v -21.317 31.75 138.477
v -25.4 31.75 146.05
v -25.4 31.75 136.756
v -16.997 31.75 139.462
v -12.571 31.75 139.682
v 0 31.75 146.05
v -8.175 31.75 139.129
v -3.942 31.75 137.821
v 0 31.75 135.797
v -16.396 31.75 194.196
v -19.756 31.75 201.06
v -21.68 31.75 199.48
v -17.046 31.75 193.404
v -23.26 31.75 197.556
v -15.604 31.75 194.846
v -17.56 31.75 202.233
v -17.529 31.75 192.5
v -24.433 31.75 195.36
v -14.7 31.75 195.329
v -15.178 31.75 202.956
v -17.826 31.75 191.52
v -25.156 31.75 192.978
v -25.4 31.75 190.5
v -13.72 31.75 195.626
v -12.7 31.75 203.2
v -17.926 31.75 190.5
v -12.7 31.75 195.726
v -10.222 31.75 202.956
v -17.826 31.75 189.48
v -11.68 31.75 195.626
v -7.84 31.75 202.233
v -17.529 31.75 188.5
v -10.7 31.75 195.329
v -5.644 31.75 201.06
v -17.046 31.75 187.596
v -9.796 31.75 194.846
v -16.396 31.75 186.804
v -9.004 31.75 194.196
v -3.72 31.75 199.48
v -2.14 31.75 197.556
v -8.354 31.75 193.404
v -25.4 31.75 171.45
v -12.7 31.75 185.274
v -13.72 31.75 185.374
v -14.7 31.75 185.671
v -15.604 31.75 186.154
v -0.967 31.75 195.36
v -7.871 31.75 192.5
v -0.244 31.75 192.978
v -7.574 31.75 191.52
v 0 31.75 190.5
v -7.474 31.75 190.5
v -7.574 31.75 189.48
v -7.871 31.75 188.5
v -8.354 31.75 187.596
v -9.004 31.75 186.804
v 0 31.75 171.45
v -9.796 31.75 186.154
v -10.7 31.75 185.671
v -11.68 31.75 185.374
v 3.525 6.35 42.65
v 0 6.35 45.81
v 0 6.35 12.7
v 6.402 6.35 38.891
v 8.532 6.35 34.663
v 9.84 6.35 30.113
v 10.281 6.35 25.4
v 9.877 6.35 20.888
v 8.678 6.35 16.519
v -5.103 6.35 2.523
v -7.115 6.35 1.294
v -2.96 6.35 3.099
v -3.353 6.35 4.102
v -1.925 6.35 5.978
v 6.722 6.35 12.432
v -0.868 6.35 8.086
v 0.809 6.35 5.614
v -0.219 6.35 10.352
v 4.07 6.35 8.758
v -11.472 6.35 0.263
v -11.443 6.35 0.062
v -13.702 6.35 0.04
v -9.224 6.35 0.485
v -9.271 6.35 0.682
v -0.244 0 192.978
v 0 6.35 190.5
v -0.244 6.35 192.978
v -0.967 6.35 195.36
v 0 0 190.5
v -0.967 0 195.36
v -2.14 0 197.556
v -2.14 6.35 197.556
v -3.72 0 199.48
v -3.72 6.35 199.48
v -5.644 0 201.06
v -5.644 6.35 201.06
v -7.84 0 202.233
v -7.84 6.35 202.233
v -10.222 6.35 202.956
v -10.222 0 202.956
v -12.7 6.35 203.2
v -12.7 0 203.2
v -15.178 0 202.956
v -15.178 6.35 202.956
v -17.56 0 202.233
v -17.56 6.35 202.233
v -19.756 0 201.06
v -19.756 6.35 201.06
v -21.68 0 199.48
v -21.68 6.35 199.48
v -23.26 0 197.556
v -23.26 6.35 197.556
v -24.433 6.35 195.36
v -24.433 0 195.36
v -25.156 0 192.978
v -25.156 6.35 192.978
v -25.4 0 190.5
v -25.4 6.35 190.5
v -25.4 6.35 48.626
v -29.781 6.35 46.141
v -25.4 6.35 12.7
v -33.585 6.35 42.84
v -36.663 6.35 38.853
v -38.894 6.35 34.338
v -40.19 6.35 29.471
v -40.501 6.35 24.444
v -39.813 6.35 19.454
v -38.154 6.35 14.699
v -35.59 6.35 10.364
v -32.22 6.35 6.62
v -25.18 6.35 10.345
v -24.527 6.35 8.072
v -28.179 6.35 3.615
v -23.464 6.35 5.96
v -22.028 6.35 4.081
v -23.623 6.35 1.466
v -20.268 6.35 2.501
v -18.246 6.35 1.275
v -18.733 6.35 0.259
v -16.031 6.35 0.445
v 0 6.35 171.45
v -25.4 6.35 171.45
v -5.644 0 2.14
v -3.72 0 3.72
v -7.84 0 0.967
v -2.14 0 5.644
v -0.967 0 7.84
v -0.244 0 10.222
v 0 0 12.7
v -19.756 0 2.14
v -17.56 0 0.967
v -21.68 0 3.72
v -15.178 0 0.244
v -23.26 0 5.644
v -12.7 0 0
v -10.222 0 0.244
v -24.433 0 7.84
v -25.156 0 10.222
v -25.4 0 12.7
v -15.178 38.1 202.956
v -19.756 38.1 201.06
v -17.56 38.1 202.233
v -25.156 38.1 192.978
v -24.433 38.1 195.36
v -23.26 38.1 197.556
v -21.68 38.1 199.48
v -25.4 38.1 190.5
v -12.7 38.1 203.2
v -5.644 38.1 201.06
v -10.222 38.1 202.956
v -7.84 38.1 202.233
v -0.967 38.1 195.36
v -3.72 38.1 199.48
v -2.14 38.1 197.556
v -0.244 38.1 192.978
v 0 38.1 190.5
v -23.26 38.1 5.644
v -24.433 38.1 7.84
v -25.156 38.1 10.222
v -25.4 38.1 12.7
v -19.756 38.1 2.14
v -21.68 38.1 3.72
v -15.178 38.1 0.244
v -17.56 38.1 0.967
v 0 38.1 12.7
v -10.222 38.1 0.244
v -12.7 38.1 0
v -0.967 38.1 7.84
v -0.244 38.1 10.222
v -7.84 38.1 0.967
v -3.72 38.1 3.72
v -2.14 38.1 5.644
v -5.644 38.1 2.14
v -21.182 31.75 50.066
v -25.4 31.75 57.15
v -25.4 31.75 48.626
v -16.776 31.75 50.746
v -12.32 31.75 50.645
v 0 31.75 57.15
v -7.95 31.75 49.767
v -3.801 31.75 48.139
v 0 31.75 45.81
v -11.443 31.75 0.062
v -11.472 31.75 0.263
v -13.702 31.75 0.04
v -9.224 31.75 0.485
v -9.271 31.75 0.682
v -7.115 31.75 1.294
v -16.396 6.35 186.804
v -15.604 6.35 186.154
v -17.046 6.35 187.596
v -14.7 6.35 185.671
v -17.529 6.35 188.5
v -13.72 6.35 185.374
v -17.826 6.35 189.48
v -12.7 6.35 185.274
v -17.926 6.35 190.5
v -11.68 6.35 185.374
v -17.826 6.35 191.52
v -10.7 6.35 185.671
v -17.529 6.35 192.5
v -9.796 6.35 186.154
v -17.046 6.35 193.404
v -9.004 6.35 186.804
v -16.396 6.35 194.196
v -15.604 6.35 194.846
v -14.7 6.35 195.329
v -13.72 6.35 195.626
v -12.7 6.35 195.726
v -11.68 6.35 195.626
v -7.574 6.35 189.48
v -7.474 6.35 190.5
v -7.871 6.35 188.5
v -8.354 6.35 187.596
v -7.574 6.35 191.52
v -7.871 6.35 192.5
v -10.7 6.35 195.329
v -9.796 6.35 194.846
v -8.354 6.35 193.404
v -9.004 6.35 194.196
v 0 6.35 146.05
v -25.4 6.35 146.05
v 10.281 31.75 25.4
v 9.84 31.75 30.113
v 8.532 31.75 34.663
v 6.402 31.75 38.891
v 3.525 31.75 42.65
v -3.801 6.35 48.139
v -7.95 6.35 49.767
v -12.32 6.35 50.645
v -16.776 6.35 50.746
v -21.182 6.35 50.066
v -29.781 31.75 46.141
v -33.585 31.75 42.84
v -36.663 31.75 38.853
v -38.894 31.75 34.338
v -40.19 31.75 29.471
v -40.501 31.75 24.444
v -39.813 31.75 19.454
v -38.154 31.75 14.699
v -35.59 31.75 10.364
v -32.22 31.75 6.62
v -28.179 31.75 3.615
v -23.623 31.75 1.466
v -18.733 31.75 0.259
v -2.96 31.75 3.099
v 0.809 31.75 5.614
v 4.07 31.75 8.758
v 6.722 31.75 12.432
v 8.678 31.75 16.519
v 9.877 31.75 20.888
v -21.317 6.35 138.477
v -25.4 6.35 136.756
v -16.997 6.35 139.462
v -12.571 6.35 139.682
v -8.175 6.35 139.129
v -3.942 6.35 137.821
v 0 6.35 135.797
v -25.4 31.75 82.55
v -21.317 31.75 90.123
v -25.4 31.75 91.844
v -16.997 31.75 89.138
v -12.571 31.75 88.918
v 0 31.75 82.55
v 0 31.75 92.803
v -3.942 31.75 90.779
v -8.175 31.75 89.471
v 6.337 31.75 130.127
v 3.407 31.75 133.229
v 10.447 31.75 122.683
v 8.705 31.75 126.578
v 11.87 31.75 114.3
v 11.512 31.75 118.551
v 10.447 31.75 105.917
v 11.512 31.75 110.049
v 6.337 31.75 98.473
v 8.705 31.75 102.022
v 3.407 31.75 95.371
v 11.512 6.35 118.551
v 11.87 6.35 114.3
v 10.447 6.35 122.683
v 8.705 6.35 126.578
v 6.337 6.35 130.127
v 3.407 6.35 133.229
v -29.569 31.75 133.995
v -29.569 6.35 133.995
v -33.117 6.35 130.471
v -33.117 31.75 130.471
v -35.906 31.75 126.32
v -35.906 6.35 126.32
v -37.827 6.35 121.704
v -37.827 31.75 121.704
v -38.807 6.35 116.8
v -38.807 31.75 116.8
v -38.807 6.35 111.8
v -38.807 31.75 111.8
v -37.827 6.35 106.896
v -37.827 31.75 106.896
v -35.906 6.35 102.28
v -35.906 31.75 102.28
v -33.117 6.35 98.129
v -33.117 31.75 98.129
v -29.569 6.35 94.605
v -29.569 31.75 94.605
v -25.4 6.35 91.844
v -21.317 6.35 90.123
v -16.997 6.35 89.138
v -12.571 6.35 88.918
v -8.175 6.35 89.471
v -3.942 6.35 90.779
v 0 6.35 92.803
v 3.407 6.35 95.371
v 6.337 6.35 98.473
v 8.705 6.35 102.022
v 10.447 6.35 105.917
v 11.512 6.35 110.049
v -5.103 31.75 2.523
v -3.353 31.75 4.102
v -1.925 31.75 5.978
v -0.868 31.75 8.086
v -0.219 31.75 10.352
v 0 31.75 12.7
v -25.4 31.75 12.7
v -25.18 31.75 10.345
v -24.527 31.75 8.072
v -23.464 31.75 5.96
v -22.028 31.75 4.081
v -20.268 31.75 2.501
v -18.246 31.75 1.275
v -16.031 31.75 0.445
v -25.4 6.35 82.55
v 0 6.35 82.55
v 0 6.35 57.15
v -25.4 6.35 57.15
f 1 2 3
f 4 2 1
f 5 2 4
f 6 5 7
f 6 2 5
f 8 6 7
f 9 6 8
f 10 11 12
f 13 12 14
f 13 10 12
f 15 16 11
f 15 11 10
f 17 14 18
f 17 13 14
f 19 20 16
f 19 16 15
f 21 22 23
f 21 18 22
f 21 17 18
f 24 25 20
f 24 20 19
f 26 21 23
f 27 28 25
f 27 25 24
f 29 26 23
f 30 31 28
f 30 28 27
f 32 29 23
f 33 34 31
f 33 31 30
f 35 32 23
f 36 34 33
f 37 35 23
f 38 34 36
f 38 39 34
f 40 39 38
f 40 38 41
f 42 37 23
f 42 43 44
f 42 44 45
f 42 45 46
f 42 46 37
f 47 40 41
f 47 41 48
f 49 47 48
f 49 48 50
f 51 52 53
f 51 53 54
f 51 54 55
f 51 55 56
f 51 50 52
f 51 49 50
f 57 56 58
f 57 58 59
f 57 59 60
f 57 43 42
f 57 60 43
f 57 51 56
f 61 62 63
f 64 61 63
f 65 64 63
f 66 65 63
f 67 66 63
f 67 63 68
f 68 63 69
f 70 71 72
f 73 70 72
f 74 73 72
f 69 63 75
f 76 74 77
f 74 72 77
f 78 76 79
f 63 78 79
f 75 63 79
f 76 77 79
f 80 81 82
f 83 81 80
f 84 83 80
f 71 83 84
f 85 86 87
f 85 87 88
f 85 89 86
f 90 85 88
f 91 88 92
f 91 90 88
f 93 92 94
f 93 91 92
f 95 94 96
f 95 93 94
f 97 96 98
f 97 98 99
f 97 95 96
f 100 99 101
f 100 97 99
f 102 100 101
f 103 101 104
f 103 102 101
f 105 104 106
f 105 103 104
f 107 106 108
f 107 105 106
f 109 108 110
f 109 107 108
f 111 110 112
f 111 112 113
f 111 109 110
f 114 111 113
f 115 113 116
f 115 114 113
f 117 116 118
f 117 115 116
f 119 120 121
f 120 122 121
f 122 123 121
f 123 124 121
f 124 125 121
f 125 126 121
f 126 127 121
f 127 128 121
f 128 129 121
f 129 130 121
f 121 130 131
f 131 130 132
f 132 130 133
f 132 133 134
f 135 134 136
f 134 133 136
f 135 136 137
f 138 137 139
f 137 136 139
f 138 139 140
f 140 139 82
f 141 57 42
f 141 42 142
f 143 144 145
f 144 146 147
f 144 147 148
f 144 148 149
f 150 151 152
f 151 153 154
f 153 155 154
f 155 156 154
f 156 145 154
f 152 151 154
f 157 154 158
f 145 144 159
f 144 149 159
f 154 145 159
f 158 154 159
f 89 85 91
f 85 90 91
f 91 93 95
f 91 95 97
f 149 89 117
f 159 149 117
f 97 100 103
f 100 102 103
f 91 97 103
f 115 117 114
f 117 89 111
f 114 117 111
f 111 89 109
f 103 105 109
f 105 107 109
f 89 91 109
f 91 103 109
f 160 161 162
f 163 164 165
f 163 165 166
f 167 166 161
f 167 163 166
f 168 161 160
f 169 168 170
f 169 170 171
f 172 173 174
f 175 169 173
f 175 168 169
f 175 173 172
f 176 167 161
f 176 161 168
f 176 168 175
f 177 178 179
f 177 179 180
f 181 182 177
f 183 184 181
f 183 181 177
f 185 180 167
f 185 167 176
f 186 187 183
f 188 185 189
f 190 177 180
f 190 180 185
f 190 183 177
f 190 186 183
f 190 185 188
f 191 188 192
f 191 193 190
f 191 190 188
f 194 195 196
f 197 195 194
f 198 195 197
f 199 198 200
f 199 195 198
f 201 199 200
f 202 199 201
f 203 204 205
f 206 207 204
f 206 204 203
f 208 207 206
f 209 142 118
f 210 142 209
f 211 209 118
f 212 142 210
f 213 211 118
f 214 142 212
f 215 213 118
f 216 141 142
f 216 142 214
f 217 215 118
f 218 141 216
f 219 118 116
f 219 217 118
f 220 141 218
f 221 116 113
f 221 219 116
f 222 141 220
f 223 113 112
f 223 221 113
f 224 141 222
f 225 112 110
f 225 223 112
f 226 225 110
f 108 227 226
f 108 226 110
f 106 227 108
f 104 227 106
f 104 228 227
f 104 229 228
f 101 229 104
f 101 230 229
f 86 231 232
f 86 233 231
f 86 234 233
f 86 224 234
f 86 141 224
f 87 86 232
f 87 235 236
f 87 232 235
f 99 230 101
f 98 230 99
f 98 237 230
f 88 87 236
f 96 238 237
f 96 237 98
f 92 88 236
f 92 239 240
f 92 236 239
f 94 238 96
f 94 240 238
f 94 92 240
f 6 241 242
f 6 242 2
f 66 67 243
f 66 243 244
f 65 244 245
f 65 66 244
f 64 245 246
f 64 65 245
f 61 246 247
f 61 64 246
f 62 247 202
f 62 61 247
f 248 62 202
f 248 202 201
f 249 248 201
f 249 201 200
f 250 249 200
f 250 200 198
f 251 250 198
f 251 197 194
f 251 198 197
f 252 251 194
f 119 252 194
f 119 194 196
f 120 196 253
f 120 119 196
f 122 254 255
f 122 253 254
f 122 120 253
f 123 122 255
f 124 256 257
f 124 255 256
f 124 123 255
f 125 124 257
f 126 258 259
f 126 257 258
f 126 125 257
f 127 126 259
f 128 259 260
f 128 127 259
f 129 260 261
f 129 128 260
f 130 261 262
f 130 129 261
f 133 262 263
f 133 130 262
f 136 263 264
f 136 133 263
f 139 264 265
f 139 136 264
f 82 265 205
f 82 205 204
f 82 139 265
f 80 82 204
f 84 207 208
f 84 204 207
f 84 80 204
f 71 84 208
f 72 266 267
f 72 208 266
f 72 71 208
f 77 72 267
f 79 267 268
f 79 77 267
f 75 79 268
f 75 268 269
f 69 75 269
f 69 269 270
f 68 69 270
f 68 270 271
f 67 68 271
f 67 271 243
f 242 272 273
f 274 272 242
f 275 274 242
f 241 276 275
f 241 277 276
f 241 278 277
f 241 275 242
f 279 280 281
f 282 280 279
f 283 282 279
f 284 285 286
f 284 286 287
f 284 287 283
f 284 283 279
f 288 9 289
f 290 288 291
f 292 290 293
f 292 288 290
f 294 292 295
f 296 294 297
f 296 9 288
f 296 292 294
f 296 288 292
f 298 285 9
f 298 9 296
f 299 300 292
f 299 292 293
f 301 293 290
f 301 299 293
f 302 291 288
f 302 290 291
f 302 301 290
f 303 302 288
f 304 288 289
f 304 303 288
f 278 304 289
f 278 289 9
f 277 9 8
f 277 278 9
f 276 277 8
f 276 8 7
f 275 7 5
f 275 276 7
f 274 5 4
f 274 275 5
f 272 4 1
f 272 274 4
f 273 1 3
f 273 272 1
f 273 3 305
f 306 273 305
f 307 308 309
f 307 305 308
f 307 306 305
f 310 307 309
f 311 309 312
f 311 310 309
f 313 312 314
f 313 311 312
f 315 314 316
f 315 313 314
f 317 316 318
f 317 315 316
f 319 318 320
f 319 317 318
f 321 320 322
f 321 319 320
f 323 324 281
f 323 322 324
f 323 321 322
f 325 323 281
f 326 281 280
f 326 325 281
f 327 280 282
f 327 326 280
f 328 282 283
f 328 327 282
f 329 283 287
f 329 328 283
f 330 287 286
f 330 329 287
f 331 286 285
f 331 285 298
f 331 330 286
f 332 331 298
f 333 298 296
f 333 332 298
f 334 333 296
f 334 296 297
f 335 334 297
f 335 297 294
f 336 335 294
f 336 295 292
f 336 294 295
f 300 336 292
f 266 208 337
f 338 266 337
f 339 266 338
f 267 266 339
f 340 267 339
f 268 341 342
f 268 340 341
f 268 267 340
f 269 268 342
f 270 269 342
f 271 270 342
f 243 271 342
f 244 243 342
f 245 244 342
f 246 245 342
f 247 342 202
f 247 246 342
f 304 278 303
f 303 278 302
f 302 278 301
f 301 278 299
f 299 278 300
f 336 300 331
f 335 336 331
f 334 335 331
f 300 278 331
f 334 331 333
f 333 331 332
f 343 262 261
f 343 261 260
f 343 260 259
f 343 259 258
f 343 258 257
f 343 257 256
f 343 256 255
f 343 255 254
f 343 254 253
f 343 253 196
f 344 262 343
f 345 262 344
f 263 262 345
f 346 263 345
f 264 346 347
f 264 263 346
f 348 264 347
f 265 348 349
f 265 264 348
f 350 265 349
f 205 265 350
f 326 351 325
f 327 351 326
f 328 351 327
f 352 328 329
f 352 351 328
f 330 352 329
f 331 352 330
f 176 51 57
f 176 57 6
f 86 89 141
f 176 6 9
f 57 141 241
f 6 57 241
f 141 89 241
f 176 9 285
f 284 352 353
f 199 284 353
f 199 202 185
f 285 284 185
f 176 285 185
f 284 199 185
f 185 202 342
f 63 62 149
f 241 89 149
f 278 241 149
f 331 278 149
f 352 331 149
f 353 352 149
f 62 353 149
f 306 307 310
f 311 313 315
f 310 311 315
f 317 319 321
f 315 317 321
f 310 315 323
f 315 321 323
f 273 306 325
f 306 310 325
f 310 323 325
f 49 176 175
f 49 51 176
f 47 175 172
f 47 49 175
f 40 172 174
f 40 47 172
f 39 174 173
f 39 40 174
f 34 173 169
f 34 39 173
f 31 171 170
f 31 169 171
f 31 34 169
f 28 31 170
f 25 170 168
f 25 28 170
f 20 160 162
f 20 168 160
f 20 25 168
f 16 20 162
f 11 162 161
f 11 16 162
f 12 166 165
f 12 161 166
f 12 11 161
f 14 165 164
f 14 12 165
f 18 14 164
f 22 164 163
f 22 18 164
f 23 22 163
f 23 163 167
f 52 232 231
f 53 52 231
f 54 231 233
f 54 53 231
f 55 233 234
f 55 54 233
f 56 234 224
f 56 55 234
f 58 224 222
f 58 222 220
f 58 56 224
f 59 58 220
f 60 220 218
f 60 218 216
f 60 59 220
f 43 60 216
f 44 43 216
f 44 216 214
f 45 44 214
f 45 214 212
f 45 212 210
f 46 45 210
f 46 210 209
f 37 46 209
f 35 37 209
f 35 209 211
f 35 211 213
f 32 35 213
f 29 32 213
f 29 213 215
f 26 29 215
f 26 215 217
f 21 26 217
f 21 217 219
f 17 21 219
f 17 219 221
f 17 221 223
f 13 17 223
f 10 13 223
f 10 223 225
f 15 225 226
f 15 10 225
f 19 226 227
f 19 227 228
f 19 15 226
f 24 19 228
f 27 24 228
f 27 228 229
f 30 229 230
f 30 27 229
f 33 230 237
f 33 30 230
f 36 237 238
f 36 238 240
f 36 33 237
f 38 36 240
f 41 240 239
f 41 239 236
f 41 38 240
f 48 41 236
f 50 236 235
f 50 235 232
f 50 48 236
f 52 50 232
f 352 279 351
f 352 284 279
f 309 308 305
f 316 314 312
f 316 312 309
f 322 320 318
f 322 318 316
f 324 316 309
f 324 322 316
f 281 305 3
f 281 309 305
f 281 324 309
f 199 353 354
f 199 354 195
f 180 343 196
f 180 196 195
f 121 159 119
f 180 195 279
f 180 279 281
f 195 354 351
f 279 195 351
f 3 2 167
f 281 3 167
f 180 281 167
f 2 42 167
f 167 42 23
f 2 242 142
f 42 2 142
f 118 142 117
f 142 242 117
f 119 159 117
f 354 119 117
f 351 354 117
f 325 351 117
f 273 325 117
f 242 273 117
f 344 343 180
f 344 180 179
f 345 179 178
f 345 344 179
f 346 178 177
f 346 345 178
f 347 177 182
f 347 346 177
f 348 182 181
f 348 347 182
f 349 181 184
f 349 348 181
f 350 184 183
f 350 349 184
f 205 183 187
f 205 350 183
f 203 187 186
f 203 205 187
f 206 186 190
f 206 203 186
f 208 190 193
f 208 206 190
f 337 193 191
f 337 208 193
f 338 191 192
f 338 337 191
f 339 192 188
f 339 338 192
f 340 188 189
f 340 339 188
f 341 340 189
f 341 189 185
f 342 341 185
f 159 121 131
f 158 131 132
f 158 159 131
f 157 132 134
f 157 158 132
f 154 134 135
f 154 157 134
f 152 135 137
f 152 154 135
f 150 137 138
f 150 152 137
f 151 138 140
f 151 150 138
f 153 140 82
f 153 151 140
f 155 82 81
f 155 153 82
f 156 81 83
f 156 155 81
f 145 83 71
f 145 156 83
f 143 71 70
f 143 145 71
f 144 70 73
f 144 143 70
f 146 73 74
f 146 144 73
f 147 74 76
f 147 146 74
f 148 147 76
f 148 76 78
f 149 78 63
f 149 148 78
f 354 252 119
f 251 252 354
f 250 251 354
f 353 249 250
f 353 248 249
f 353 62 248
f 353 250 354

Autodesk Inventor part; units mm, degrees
ref_plane "YZ Plane" through (0, 0, 0) normal (1, 0, 0) x (0, 1, 0)
ref_plane "XZ Plane" through (0, 0, 0) normal (0, 1, 0) x (-1, 0, 0)
ref_plane "XY Plane" through (0, 0, 0) normal (0, 0, 1) x (1, 0, 0)
sketch "Sketch1" plane through (0, 0, 0) normal (0, 1, 0) x (-1, 0, 0)
  line L0 (0, 0) -> (25.4, 0)
  line L1 (25.4, 0) -> (25.4, 203.2)
  line L2 (25.4, 203.2) -> (0, 203.2)
  line L3 (0, 203.2) -> (0, 0)
  dimension "d0" = 203.2
  dimension "d1" = 25.4
extrude "Extrusion1" add sketch "Sketch1" along normal blind 38.1
sketch "Sketch2" plane through (0, 38.1, 0) normal (0, 1, 0) x (1, 0, 0)
  circle A0 centre (-12.7, -190.5) radius 5.2265
  line L0 (-25.4, 0) -> (-25.4, -203.2) projected
  line L1 (-25.4, -203.2) -> (0, -203.2) projected
  point P0 (0, 0)
  point P1 (-25.4, -12.7)
  point P2 (-25.4, -190.5)
  dimension "d5" = 10.453
  dimension "d6" = 12.7
  dimension "d7" = 12.7
sketch "Sketch3" plane through (0, 0, 203.2) normal (1, 0, 0) x (0, 0, -1)
  line L0 (0, 0) -> (0, 38.1) projected
  line L1 (0, 31.75) -> (31.75, 31.75)
  line L2 (31.75, 31.75) -> (31.75, 6.35)
  line L3 (31.75, 6.35) -> (0, 6.35)
  line L4 (0, 6.35) -> (0, 31.75)
  line L5 (0, 38.1) -> (203.2, 38.1) projected
  line L6 (57.15, 31.75) -> (120.65, 31.75)
  line L7 (120.65, 31.75) -> (120.65, 6.35)
  line L8 (120.65, 6.35) -> (57.15, 6.35)
  line L9 (57.15, 6.35) -> (57.15, 31.75)
  line L10 (146.05, 31.75) -> (209.55, 31.75)
  line L11 (209.55, 31.75) -> (209.55, 6.35)
  line L12 (209.55, 6.35) -> (146.05, 6.35)
  line L13 (146.05, 6.35) -> (146.05, 31.75)
  point P0 (203.2, 0)
  dimension "d8" = 25.4
  dimension "d9" = 6.35
  dimension "d10" = 203.2
  dimension "d11" = 31.75
  dimension "d16" = 63.5
  dimension "d17" = 63.5
  dimension "d18" = 25.4
  dimension "d19" = 25.4
extrude "Extrusion4" cut sketch "Sketch3" against normal blind 68.2625
extrude "Extrusion3" add sketch "Sketch2" against normal blind 38.1
sketch "Sketch4" plane through (0, 6.35, 146.05) normal (0, 1, 0) x (1, 0, 0)
  circle A0 centre (-13.5299, 31.75) radius 25.4
  circle A1 centre (-15.1186, 120.65) radius 25.4
  line L0 (0, 63.5) -> (-25.4, 63.5) projected
  line L1 (0, 88.9) -> (-25.4, 88.9) projected
  point P0 (0, 146.05)
  dimension "d22" = 31.75
  dimension "d23" = 31.75
  dimension "d24" = 50.8
extrude "Extrusion5" add sketch "Sketch4" along normal blind 25.4
fillet "Fillet2" radius 12.7 8 edges at (0, 34.925, 0) (0, 3.175, 0) (-25.4, 3.175, 0) (-25.4, 34.925, 0) (0, 34.925, 203.2) (-25.4, 34.925, 203.2) (0, 3.175, 203.2) (-25.4, 3.175, 203.2)
properties part number "arm2"
